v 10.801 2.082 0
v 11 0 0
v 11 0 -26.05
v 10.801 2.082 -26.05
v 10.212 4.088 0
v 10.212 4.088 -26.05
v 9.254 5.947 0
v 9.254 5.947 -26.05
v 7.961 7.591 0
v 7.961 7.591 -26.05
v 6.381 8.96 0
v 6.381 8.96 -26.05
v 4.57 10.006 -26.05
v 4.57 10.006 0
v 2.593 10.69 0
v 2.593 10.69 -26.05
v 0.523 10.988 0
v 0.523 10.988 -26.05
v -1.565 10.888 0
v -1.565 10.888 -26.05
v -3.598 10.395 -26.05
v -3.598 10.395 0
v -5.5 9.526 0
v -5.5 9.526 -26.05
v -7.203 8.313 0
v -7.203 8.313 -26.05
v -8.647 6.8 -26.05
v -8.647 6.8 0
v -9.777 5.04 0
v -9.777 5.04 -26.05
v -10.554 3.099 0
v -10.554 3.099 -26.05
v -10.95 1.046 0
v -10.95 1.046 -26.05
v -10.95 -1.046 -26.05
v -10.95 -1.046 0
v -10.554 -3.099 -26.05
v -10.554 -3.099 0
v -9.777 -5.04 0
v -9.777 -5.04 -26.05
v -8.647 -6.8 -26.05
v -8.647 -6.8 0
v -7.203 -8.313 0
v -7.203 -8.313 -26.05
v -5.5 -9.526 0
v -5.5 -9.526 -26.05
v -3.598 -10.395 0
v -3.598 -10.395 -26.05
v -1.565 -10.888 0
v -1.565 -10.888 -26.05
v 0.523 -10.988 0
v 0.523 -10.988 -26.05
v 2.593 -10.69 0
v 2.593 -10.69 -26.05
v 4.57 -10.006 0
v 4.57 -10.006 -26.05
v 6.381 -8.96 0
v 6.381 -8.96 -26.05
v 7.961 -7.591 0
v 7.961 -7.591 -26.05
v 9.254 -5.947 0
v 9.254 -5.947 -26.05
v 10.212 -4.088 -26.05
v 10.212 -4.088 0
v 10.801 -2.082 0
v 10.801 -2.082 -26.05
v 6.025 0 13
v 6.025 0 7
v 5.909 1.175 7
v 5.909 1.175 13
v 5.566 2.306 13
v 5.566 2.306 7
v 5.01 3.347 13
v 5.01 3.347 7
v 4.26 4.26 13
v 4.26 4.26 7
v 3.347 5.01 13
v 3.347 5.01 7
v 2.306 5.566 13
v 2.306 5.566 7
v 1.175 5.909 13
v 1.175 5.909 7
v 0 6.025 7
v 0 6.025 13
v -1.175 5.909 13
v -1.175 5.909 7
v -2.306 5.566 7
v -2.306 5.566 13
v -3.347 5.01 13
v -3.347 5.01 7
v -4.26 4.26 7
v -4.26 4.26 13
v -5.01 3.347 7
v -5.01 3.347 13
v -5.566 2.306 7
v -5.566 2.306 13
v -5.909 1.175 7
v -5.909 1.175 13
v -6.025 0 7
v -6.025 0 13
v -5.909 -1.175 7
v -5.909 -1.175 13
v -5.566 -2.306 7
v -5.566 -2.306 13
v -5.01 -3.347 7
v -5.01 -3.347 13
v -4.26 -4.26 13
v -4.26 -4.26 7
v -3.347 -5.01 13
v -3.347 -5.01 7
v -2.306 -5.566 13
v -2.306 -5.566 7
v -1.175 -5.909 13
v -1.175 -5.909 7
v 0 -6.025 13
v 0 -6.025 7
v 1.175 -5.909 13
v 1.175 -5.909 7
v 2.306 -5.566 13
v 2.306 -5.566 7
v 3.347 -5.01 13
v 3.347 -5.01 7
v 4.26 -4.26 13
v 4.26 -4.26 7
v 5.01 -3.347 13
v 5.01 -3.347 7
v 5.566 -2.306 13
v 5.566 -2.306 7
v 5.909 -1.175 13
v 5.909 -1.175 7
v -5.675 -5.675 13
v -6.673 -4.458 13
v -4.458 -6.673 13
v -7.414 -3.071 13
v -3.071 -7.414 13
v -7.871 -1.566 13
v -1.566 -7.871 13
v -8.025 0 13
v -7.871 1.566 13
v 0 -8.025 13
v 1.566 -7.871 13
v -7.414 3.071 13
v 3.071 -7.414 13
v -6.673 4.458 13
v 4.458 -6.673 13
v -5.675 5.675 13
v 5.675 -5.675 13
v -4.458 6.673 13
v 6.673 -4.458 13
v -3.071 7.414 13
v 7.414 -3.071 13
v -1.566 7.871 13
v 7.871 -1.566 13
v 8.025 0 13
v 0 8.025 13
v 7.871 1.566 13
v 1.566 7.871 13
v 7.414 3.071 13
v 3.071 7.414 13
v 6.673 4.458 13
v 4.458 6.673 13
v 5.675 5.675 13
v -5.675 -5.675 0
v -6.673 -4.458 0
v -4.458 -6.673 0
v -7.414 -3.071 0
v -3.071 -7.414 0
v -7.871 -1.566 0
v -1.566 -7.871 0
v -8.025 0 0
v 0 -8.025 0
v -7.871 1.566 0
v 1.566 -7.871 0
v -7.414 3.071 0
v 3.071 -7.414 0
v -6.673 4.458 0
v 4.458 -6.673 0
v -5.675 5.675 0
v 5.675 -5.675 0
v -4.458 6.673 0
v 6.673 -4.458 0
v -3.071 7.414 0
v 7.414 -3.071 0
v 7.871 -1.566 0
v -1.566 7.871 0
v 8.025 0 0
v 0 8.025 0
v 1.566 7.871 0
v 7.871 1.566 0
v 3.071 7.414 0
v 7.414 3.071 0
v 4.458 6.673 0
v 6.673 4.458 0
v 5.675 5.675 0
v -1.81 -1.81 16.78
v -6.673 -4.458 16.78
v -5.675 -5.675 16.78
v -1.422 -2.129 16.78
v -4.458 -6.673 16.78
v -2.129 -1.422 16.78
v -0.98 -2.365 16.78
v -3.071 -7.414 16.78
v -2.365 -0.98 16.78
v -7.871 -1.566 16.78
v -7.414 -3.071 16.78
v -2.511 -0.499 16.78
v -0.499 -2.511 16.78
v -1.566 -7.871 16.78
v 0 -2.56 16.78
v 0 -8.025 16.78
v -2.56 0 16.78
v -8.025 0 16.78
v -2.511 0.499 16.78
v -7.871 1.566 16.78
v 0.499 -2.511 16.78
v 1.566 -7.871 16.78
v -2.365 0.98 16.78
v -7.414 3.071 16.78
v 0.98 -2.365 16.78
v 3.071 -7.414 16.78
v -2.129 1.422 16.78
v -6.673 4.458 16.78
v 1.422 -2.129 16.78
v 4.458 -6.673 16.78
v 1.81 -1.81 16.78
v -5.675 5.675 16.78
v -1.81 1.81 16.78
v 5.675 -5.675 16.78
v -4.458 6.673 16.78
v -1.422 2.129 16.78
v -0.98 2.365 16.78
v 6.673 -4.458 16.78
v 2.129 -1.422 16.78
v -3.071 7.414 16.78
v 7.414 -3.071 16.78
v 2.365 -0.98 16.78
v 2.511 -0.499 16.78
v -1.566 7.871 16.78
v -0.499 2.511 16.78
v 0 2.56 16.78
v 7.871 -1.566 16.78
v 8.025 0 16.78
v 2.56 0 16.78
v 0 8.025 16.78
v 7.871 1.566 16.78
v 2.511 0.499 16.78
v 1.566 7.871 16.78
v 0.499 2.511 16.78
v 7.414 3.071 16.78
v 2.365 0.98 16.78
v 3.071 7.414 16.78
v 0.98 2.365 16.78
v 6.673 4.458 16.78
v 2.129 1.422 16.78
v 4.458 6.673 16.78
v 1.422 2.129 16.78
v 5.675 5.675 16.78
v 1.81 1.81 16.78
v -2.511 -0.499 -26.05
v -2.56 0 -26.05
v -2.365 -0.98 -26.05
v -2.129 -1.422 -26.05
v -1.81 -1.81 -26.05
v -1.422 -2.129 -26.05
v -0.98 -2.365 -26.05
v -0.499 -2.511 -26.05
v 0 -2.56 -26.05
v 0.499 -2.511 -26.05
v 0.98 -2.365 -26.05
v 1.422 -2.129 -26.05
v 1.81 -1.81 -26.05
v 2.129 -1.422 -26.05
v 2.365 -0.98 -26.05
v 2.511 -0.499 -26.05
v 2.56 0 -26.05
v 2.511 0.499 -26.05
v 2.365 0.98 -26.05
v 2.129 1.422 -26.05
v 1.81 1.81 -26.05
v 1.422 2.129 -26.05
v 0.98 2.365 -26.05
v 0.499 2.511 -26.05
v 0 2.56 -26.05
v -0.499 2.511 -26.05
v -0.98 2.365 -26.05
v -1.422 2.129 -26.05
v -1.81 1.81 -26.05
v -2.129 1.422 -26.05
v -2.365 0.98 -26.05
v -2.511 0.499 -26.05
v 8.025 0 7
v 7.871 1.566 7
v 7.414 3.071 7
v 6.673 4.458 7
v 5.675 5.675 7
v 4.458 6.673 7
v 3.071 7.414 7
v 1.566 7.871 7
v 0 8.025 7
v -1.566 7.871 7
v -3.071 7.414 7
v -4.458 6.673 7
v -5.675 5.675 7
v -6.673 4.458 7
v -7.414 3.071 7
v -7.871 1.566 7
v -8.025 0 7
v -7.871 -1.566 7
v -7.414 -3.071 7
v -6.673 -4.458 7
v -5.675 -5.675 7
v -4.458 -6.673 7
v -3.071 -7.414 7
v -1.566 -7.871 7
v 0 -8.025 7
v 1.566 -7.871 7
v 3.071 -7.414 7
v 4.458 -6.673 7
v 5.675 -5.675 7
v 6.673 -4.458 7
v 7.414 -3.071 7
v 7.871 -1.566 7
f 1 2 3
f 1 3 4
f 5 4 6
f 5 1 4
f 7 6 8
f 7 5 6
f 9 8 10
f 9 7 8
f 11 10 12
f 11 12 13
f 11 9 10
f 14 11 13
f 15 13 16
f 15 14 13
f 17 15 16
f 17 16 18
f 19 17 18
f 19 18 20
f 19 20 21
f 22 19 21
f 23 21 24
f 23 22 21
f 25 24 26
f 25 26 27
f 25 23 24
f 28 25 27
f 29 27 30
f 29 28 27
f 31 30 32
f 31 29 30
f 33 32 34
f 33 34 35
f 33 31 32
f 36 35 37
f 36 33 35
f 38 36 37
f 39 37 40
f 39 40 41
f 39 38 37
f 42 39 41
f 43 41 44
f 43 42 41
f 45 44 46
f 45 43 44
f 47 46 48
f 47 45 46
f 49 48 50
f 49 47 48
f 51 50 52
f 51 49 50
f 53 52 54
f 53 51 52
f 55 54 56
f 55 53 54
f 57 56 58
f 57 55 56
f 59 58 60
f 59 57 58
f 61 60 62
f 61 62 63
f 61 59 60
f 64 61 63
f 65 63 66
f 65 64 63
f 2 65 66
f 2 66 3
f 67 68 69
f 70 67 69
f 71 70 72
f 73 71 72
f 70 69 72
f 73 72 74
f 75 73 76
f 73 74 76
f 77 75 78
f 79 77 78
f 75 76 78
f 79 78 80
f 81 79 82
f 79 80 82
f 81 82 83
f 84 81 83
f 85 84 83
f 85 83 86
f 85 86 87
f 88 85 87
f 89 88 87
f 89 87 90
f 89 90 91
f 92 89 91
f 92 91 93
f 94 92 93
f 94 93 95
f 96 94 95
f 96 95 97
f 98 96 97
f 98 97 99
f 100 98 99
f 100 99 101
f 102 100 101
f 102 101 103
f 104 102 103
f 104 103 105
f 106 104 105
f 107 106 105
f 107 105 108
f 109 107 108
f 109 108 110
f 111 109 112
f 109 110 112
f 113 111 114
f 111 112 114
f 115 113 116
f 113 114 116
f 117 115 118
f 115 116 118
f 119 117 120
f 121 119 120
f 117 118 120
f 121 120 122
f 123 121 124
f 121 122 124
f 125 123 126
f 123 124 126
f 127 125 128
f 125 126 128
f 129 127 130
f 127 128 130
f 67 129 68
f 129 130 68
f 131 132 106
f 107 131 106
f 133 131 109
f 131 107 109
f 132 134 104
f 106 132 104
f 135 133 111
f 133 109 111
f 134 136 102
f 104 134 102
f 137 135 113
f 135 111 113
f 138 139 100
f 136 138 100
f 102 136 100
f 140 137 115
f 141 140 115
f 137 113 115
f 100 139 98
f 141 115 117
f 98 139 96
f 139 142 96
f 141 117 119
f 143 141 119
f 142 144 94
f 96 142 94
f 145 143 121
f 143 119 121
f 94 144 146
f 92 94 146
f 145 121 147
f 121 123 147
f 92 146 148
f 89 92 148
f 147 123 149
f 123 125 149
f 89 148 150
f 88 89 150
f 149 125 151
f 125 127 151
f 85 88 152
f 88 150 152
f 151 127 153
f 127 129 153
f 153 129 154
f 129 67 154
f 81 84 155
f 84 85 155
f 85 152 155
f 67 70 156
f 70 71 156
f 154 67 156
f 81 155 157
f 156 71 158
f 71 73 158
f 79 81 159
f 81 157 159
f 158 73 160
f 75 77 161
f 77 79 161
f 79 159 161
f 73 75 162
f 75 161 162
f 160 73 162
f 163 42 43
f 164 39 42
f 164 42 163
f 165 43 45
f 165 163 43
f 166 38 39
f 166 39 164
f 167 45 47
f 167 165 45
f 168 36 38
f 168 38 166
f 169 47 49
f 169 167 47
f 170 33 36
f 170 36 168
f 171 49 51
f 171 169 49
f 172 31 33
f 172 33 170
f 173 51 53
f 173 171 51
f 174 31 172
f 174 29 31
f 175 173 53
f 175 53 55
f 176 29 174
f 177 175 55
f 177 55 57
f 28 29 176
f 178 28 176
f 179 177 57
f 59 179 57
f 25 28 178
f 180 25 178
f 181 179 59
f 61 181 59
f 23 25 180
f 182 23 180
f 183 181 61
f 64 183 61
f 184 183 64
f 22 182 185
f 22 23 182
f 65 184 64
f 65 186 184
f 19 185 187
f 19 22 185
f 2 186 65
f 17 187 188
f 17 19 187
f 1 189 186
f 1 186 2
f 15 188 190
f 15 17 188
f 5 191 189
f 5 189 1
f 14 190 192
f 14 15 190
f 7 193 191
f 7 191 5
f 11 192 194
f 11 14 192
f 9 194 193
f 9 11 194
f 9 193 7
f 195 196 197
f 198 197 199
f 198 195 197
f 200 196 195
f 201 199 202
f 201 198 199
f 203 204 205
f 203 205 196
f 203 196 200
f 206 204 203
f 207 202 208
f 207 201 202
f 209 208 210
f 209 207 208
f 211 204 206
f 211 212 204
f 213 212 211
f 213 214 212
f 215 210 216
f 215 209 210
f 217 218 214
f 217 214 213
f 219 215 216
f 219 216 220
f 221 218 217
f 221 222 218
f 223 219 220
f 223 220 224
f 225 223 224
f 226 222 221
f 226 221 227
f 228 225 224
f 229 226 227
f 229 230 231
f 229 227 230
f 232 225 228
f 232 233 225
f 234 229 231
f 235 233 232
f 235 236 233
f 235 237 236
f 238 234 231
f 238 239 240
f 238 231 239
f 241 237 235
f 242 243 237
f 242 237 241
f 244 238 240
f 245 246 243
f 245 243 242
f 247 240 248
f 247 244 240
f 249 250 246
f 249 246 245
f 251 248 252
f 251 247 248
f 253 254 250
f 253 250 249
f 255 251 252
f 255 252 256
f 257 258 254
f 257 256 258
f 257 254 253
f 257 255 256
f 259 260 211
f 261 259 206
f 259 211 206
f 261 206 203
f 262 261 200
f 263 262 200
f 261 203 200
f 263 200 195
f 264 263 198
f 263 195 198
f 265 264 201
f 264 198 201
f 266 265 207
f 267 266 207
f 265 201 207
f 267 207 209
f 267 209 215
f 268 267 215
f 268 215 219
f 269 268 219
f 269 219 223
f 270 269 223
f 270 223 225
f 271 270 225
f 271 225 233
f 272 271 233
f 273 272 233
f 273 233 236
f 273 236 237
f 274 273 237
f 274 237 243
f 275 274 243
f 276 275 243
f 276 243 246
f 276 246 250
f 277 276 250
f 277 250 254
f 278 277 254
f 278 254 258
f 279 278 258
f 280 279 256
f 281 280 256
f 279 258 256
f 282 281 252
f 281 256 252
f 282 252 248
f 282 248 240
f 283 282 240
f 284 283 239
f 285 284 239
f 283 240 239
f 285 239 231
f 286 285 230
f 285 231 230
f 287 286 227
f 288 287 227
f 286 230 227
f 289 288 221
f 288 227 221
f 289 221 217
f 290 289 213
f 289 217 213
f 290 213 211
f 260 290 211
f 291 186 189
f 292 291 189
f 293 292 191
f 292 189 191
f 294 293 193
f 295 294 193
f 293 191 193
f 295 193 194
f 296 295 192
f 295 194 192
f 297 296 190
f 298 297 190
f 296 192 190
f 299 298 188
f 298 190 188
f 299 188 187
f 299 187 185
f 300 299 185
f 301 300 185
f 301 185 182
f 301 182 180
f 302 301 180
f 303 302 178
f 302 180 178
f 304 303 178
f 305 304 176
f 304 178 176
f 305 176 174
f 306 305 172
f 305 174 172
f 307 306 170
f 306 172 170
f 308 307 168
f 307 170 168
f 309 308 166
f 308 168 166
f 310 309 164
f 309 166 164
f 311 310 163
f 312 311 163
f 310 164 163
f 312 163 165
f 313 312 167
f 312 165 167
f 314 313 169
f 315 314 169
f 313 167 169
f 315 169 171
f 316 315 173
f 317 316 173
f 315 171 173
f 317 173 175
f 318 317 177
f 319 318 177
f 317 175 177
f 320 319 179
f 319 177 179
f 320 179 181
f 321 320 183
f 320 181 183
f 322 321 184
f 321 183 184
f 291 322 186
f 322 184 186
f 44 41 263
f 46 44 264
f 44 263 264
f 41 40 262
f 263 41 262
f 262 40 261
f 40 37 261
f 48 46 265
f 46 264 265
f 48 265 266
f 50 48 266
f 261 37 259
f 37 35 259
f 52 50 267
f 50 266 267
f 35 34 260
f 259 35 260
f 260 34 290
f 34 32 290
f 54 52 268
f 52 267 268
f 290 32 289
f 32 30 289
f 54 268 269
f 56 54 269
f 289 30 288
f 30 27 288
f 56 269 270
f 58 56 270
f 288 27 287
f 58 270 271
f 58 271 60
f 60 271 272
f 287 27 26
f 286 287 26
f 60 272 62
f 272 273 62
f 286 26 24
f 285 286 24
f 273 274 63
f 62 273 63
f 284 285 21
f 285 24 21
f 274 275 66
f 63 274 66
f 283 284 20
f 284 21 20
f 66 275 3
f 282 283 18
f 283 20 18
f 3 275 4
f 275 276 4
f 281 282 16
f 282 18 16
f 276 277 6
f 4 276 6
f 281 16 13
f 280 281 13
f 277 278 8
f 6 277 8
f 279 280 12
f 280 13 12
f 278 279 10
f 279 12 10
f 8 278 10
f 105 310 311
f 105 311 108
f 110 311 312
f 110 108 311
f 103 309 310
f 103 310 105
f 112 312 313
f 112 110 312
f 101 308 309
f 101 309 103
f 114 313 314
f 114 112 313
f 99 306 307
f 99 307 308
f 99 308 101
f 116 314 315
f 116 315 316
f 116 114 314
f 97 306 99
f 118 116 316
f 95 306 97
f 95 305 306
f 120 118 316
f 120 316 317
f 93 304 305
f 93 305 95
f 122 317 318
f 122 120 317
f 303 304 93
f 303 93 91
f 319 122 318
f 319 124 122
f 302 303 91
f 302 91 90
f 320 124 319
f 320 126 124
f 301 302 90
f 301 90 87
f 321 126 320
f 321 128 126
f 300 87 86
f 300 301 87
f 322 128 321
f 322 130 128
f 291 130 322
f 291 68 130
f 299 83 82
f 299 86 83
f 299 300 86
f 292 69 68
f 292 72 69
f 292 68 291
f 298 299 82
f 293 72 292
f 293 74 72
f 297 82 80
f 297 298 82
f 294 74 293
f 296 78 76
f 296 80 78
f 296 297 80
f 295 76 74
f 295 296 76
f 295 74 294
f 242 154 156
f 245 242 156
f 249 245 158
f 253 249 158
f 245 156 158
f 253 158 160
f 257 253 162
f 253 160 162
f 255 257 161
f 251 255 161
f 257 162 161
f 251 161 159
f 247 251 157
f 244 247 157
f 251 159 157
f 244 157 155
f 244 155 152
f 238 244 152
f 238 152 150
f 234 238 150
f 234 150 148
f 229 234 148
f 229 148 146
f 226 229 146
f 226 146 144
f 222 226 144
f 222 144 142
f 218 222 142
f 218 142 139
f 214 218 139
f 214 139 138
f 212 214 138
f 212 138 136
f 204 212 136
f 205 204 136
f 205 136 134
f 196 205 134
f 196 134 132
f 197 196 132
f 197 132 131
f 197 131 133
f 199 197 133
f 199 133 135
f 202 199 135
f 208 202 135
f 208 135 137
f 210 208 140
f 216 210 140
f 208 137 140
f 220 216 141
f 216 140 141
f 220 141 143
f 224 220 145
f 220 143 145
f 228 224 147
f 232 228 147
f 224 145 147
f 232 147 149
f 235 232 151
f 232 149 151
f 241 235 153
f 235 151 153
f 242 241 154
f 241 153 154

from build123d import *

# Parameters (mm, degrees)
F0_R     = 11
F0_R_2   = 8.025
F0_R_3   = 6.025
F1_DEPTH = 26.05
F2_DEPTH = 16.78
F3_DEPTH = 13
F4_DEPTH = 7
F6_D     = 5.12
F6_DEPTH = 120
F6_TIP   = 1.5382031847


with BuildPart() as f1:
    # F0 (on Top) → F1 (new body)
    with BuildSketch(Plane.XY):
        Circle(F0_R)
        Circle(F0_R_2, mode=Mode.SUBTRACT)
        Circle(F0_R_2)
        Circle(F0_R_3, mode=Mode.SUBTRACT)
        Circle(F0_R_3)
    extrude(amount=-F1_DEPTH)

    # F0 (on Top) → F2 (join)
    with BuildSketch(Plane.XY):
        Circle(F0_R_2)
        Circle(F0_R_3, mode=Mode.SUBTRACT)
        Circle(F0_R_3)
    extrude(amount=F2_DEPTH)

    # F0 (on Top) → F3 (cut)
    with BuildSketch(Plane.XY):
        Circle(F0_R_2)
        Circle(F0_R_3, mode=Mode.SUBTRACT)
    extrude(amount=F3_DEPTH, mode=Mode.SUBTRACT)

    # F0 (on Top) → F4 (join)
    with BuildSketch(Plane.XY):
        Circle(F0_R_2)
        Circle(F0_R_3, mode=Mode.SUBTRACT)
    extrude(amount=F4_DEPTH)

    # F6
    with Locations(Plane(origin=(0, 0, -26.05), x_dir=(1, 0, 0), z_dir=(0, 0, -1))):
        with Locations((0, 0)):
            Hole(F6_D / 2, depth=F6_DEPTH)
            with Locations((0, 0, -(F6_DEPTH + F6_TIP / 2))):  # 118° drill point
                Cone(0, F6_D / 2, F6_TIP, mode=Mode.SUBTRACT)


solid = f1.part
